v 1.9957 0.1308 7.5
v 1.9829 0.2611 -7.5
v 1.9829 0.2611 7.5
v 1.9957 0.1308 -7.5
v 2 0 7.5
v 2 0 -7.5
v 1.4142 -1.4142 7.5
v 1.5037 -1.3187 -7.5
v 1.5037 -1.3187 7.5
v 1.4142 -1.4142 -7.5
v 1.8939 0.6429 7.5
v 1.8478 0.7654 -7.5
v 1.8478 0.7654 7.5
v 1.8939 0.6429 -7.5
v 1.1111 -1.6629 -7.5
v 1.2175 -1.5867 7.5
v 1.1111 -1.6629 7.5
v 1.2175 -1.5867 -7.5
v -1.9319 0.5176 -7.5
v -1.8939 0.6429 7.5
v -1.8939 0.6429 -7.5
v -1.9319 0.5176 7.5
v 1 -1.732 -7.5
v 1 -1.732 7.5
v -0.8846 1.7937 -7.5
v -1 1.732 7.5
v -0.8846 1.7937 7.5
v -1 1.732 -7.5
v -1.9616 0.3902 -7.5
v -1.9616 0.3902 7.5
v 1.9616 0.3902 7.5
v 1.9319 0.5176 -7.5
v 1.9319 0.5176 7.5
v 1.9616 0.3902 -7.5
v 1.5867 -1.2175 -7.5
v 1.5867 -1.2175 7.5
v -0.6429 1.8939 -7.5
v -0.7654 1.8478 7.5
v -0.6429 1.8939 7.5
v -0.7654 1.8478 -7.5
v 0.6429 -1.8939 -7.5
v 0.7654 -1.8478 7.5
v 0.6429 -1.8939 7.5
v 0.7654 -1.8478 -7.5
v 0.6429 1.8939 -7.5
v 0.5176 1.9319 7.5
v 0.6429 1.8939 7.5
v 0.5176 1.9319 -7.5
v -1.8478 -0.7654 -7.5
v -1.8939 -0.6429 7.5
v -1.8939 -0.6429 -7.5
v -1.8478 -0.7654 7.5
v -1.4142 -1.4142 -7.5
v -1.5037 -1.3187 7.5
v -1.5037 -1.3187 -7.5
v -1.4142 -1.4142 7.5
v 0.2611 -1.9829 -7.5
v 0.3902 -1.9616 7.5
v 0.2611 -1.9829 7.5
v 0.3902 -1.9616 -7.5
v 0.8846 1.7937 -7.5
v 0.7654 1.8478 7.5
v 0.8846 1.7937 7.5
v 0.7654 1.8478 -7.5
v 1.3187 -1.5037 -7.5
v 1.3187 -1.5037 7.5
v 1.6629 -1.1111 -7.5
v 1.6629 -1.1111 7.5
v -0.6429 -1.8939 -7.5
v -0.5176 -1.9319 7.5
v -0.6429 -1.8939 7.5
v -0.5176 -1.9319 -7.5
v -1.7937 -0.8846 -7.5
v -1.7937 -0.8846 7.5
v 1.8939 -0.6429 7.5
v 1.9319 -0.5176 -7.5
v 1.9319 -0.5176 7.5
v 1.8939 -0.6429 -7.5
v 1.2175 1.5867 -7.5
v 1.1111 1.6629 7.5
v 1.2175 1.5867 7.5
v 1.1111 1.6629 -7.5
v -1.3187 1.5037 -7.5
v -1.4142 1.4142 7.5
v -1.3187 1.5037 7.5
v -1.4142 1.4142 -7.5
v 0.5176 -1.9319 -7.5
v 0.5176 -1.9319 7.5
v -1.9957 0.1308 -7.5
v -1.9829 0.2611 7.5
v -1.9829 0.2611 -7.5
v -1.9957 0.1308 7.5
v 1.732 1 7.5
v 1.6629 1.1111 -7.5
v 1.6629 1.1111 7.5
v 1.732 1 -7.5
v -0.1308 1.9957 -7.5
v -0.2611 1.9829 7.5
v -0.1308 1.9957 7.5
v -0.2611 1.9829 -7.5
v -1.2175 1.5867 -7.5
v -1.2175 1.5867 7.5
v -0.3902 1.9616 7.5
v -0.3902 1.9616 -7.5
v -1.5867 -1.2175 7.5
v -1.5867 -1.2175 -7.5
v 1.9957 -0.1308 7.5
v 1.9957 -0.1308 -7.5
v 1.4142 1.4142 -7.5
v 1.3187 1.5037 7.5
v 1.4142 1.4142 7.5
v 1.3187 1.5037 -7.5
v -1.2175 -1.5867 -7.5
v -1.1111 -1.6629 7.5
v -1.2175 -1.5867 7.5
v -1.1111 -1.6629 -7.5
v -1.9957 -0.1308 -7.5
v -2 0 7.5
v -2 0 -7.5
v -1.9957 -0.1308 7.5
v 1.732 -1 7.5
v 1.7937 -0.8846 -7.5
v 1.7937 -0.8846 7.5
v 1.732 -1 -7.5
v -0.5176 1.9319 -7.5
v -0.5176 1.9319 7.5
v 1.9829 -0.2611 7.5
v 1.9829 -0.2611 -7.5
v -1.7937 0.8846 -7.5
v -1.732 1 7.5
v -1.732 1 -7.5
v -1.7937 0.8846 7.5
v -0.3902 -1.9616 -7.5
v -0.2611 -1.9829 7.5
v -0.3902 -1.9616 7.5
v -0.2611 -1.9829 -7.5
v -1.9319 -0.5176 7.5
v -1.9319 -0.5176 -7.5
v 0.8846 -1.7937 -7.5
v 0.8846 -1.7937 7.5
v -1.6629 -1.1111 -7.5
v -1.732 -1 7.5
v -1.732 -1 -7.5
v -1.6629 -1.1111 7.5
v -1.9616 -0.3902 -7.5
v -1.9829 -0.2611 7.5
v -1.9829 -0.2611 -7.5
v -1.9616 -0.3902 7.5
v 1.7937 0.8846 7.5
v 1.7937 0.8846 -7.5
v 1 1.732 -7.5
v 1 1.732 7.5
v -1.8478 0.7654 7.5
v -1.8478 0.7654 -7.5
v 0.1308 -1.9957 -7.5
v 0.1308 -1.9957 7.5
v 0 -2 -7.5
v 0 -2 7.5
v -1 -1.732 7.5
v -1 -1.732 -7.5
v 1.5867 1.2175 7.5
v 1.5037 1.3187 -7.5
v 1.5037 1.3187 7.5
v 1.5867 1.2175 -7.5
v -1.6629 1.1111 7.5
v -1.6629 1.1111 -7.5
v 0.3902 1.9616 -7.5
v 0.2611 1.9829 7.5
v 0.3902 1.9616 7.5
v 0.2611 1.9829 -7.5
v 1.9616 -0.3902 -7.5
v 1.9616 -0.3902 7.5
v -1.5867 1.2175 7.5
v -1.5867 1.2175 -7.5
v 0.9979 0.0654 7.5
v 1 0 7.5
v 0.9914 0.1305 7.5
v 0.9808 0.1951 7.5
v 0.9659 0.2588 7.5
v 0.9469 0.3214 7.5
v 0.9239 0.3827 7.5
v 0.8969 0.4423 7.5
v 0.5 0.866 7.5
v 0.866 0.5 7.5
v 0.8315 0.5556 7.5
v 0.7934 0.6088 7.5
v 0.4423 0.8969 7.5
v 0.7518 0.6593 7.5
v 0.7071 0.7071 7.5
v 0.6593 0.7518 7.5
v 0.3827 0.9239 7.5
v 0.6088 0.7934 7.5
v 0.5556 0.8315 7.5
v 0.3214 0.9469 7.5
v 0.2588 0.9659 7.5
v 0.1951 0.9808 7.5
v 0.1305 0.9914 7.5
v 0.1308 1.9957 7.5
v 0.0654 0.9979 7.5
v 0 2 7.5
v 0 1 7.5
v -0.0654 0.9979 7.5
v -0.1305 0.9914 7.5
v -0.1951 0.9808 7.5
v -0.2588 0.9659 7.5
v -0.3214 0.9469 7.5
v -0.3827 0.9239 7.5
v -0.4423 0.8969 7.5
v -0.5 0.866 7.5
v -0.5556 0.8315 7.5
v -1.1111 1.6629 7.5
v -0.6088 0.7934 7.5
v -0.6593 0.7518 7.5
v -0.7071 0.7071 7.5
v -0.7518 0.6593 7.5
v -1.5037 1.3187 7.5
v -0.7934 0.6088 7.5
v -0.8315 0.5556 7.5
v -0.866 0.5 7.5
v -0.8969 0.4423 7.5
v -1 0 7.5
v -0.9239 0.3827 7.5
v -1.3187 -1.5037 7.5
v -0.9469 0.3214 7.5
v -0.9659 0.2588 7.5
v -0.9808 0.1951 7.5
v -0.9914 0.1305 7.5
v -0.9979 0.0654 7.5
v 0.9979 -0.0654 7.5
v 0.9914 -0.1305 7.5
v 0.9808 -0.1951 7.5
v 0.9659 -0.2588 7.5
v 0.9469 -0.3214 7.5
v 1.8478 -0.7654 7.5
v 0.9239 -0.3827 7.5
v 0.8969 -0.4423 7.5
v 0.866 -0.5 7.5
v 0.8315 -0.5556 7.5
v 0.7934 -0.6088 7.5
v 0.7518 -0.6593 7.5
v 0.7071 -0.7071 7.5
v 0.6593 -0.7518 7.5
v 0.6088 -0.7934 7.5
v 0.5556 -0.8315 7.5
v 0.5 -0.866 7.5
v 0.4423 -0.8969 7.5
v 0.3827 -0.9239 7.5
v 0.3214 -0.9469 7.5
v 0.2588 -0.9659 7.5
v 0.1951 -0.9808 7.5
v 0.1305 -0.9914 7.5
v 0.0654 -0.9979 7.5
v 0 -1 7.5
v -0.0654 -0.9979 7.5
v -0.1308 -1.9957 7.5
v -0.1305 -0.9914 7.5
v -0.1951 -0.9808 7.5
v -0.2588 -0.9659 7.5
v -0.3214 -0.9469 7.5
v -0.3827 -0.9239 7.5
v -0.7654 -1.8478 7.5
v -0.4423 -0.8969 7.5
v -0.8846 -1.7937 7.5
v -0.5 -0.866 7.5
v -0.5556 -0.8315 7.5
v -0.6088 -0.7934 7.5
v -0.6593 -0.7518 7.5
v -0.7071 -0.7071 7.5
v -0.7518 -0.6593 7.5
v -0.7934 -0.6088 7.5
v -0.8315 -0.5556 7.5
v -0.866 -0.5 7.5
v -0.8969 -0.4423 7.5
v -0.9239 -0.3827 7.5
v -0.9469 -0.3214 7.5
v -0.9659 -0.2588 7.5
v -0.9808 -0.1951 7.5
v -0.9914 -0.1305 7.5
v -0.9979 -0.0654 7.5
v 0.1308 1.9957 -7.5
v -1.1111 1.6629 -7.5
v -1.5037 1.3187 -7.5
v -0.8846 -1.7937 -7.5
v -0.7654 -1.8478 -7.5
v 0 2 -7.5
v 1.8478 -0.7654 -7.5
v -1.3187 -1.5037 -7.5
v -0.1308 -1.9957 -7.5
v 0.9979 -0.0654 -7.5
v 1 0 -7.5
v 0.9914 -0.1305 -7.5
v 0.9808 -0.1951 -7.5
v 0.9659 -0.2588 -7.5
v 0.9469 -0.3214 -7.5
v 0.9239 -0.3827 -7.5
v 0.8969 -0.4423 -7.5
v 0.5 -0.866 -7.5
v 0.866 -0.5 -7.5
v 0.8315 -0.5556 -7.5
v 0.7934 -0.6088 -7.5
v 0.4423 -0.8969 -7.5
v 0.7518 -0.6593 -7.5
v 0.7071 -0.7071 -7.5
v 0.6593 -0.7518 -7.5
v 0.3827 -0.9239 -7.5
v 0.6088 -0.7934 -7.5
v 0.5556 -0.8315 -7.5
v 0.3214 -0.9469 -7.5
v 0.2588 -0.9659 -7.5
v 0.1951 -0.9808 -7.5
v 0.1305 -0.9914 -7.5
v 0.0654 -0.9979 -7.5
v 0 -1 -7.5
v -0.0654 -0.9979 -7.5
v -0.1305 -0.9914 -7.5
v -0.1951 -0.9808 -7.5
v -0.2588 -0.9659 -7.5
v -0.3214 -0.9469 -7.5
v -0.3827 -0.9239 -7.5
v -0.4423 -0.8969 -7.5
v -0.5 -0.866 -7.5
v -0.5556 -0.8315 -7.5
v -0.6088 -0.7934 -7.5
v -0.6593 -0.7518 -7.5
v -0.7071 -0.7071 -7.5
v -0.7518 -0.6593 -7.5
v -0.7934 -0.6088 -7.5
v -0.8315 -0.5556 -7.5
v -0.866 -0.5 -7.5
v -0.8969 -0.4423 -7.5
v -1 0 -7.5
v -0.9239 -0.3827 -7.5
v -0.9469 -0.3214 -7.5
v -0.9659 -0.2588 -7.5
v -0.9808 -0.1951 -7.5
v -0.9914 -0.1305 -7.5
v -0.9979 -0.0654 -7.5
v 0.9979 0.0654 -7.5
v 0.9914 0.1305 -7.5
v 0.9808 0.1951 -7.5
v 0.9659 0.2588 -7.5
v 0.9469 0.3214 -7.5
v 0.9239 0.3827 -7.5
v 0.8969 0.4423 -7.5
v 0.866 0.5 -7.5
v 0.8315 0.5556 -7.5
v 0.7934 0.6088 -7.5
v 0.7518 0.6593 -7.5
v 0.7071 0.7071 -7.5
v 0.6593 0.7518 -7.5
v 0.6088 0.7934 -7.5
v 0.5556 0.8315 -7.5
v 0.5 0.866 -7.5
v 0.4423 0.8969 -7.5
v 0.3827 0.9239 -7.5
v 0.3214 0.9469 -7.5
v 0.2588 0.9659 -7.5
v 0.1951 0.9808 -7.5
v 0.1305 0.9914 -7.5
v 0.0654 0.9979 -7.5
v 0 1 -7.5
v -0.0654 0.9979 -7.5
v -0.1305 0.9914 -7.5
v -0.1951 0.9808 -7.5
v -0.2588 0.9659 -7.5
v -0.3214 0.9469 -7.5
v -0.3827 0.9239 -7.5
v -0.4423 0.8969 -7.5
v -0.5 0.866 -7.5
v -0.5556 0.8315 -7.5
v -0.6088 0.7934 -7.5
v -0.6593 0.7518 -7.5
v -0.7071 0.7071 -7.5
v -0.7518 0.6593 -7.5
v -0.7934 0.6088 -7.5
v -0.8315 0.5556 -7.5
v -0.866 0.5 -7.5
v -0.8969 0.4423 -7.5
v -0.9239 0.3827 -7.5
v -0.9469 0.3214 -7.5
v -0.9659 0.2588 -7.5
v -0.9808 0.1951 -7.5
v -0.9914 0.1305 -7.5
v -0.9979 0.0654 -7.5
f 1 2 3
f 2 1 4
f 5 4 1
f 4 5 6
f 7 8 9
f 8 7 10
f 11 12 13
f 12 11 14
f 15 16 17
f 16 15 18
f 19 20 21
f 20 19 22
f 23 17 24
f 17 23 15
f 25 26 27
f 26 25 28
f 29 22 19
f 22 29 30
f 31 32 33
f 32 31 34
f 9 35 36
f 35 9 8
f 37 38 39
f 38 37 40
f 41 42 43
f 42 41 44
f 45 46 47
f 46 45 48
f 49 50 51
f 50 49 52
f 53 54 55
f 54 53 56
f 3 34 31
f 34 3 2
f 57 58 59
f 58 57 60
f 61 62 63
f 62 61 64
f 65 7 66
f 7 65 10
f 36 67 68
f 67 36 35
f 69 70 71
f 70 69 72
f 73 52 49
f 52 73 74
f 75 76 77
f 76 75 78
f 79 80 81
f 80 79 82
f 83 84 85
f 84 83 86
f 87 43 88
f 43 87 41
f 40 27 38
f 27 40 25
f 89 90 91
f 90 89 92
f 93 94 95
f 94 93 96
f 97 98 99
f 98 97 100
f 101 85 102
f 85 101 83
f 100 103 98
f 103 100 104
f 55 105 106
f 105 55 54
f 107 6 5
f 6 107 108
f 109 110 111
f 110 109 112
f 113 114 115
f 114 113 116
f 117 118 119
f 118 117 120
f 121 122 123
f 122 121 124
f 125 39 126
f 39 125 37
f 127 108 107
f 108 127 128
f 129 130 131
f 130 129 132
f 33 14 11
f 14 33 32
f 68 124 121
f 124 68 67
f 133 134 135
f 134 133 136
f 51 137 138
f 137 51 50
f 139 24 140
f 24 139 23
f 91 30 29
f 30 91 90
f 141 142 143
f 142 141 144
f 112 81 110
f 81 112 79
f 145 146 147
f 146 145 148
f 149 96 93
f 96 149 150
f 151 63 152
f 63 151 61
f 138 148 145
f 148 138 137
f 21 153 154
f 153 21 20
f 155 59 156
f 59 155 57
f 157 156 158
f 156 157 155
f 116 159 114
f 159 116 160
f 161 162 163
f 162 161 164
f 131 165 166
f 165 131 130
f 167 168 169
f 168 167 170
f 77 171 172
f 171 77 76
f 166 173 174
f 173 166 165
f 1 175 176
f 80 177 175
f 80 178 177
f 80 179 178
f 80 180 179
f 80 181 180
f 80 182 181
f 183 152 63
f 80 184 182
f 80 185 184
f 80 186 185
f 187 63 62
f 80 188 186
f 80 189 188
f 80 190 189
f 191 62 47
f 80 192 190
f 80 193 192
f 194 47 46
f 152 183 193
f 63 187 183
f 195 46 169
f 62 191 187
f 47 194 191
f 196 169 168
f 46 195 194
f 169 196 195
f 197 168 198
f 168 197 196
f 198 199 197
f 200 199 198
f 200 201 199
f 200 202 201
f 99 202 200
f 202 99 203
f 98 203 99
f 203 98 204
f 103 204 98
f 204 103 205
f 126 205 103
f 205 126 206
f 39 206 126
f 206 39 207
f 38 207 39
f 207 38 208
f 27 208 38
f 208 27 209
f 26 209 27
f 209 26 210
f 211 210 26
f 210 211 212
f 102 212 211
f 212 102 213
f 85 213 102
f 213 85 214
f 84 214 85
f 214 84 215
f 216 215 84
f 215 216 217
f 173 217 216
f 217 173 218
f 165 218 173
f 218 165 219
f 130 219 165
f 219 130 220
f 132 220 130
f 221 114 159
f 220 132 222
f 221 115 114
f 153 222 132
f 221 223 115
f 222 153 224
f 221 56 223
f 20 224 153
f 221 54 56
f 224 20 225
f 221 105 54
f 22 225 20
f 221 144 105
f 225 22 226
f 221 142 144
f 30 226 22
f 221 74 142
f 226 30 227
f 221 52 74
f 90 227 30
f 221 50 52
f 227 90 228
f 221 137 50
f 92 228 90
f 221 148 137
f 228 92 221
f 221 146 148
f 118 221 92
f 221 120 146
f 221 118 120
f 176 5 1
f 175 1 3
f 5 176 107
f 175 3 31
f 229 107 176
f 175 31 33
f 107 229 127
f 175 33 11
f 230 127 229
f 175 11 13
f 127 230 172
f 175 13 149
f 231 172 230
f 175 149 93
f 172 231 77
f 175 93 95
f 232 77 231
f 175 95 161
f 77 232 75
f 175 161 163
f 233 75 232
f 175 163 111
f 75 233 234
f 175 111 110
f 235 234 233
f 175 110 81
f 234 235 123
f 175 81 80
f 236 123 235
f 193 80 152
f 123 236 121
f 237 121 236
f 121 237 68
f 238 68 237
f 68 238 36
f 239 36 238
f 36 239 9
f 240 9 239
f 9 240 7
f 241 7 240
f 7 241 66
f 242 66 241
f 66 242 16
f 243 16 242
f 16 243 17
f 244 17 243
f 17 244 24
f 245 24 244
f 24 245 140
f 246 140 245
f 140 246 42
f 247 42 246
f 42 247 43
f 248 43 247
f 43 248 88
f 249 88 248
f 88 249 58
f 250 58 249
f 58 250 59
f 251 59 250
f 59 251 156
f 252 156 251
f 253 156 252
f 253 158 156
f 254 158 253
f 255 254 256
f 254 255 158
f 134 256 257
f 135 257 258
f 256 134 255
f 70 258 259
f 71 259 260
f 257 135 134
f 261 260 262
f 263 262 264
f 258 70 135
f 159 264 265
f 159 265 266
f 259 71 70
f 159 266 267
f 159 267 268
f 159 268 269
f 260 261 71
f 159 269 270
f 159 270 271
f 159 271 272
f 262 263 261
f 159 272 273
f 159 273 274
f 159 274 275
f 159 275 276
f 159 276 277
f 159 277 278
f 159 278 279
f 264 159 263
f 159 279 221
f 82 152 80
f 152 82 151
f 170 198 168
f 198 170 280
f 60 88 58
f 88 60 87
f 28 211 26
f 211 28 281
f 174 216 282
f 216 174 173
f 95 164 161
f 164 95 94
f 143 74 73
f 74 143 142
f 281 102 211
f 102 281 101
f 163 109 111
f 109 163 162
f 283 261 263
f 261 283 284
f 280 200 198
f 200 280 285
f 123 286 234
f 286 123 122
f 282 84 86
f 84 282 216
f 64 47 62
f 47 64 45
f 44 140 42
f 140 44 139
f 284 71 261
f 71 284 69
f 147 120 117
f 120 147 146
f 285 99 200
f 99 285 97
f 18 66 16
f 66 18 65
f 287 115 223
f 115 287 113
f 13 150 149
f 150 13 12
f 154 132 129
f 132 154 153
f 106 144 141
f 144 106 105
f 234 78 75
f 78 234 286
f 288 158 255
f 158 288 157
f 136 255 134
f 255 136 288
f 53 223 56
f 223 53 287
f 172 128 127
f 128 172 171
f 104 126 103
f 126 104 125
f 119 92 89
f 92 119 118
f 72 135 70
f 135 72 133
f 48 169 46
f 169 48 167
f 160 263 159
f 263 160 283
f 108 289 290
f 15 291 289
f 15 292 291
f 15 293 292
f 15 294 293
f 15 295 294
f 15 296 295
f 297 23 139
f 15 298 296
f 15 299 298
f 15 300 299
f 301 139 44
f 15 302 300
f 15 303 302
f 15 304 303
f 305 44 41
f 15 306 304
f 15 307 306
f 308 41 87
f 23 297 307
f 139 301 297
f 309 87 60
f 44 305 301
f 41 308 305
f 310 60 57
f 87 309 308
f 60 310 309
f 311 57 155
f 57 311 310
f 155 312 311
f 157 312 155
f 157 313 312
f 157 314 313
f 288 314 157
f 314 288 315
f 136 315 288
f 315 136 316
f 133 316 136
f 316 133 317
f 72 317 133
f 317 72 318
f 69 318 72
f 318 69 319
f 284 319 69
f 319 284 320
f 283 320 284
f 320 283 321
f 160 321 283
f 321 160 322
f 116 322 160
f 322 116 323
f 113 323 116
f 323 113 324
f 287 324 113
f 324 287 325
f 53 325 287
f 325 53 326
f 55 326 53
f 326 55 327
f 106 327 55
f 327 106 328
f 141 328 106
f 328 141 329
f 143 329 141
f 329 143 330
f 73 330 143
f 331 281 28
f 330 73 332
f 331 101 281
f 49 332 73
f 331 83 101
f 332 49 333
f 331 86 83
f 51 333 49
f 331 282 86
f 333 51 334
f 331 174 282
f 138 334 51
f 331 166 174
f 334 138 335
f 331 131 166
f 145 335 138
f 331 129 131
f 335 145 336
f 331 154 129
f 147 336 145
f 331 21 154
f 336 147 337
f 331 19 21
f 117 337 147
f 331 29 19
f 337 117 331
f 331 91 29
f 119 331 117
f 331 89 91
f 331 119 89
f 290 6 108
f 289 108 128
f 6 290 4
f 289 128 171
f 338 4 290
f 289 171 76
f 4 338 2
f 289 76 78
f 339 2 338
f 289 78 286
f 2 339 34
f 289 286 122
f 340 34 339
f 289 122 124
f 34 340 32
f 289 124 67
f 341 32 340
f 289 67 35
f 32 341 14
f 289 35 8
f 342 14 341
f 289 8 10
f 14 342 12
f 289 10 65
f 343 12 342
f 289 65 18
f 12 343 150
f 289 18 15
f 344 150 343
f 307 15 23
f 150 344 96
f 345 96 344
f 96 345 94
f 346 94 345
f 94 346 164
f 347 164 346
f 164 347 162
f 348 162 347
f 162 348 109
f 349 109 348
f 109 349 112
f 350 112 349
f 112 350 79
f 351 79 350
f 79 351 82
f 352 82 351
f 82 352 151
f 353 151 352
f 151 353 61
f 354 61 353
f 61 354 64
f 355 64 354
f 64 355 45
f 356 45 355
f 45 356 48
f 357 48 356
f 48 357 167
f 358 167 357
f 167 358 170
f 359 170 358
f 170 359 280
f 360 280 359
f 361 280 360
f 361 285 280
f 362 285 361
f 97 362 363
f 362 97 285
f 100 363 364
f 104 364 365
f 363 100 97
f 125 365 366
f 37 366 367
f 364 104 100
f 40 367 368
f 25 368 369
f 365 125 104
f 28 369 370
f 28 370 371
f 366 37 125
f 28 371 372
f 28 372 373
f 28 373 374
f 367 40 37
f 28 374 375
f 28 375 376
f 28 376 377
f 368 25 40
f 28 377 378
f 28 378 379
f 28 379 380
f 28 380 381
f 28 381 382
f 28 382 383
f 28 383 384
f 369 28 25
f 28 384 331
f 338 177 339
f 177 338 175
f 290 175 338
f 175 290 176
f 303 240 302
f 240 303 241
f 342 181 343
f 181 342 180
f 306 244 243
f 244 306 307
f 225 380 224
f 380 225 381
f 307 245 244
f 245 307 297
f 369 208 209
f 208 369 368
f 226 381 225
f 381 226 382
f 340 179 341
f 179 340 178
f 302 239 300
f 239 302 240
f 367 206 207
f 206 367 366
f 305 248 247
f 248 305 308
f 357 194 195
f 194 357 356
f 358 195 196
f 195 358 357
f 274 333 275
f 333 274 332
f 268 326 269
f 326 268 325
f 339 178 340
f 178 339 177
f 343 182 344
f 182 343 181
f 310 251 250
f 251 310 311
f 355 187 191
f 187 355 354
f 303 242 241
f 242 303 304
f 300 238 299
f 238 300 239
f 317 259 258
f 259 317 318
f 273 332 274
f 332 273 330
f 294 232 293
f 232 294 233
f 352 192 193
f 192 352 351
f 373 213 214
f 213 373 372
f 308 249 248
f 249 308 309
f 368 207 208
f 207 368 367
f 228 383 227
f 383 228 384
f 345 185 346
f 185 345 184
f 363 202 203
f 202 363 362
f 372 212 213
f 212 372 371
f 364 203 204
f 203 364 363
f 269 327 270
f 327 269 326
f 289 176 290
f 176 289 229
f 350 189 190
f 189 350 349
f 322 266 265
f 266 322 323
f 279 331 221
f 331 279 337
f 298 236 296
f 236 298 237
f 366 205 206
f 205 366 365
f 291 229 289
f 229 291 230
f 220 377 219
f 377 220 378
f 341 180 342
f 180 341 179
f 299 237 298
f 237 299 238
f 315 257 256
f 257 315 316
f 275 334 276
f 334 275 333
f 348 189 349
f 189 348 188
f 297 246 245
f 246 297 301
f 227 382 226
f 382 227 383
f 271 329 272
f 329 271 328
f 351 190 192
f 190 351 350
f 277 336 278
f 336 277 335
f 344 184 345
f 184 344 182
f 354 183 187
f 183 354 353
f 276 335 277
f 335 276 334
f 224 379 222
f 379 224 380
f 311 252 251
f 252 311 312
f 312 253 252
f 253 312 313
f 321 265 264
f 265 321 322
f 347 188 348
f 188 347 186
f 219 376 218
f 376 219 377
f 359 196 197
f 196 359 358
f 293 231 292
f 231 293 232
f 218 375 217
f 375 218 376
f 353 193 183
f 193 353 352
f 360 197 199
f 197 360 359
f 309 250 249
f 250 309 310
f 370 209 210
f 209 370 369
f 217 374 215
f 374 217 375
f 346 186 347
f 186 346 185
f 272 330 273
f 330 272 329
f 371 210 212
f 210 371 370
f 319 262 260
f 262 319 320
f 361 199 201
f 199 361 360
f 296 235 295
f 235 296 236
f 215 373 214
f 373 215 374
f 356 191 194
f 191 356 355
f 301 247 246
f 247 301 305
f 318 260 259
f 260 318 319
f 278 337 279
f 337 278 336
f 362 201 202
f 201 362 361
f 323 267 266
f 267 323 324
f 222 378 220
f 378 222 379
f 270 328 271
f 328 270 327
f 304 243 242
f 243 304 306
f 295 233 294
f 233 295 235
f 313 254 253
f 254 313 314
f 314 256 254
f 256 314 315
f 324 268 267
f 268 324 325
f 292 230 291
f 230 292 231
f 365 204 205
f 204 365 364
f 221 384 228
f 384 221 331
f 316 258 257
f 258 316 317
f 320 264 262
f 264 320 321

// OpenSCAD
// Heatshrink sleeving (hollow cylindrical tube) - single connected solid

// Parameters
length = 15; //[8:30:1]
outer_diameter = 4; //[2:8:0.1]
inner_diameter_original = 2; //[1:4:0.1]
forced_id = 0; //[0:4:0.1]
center = 1; //[0:1:1]
overlap = 1; //[0.5:2:0.1]
path_enabled = 0; //[0:1:1]
path_length = 15; //[8:60:1]

// Derived
id_effective = (forced_id > 0 ? forced_id : inner_diameter_original);
od_effective = outer_diameter;
tube_h = (path_enabled > 0 ? path_length : length);

// Safety/robustness
eps = 0.02;
$fn = 96;

module heatshrink_tube() {
    // Ensure valid wall thickness
    id_safe = min(id_effective, od_effective - 2*eps);
    od_safe = max(od_effective, id_safe + 2*eps);

    difference() {
        cylinder(h=tube_h, r=od_safe/2, center=true);
        cylinder(h=tube_h + 2*overlap, r=id_safe/2, center=true);
    }
}

// Assembly (one connected solid: just the tube)
translate([0, 0, (center > 0 ? 0 : tube_h/2)])
    heatshrink_tube();
